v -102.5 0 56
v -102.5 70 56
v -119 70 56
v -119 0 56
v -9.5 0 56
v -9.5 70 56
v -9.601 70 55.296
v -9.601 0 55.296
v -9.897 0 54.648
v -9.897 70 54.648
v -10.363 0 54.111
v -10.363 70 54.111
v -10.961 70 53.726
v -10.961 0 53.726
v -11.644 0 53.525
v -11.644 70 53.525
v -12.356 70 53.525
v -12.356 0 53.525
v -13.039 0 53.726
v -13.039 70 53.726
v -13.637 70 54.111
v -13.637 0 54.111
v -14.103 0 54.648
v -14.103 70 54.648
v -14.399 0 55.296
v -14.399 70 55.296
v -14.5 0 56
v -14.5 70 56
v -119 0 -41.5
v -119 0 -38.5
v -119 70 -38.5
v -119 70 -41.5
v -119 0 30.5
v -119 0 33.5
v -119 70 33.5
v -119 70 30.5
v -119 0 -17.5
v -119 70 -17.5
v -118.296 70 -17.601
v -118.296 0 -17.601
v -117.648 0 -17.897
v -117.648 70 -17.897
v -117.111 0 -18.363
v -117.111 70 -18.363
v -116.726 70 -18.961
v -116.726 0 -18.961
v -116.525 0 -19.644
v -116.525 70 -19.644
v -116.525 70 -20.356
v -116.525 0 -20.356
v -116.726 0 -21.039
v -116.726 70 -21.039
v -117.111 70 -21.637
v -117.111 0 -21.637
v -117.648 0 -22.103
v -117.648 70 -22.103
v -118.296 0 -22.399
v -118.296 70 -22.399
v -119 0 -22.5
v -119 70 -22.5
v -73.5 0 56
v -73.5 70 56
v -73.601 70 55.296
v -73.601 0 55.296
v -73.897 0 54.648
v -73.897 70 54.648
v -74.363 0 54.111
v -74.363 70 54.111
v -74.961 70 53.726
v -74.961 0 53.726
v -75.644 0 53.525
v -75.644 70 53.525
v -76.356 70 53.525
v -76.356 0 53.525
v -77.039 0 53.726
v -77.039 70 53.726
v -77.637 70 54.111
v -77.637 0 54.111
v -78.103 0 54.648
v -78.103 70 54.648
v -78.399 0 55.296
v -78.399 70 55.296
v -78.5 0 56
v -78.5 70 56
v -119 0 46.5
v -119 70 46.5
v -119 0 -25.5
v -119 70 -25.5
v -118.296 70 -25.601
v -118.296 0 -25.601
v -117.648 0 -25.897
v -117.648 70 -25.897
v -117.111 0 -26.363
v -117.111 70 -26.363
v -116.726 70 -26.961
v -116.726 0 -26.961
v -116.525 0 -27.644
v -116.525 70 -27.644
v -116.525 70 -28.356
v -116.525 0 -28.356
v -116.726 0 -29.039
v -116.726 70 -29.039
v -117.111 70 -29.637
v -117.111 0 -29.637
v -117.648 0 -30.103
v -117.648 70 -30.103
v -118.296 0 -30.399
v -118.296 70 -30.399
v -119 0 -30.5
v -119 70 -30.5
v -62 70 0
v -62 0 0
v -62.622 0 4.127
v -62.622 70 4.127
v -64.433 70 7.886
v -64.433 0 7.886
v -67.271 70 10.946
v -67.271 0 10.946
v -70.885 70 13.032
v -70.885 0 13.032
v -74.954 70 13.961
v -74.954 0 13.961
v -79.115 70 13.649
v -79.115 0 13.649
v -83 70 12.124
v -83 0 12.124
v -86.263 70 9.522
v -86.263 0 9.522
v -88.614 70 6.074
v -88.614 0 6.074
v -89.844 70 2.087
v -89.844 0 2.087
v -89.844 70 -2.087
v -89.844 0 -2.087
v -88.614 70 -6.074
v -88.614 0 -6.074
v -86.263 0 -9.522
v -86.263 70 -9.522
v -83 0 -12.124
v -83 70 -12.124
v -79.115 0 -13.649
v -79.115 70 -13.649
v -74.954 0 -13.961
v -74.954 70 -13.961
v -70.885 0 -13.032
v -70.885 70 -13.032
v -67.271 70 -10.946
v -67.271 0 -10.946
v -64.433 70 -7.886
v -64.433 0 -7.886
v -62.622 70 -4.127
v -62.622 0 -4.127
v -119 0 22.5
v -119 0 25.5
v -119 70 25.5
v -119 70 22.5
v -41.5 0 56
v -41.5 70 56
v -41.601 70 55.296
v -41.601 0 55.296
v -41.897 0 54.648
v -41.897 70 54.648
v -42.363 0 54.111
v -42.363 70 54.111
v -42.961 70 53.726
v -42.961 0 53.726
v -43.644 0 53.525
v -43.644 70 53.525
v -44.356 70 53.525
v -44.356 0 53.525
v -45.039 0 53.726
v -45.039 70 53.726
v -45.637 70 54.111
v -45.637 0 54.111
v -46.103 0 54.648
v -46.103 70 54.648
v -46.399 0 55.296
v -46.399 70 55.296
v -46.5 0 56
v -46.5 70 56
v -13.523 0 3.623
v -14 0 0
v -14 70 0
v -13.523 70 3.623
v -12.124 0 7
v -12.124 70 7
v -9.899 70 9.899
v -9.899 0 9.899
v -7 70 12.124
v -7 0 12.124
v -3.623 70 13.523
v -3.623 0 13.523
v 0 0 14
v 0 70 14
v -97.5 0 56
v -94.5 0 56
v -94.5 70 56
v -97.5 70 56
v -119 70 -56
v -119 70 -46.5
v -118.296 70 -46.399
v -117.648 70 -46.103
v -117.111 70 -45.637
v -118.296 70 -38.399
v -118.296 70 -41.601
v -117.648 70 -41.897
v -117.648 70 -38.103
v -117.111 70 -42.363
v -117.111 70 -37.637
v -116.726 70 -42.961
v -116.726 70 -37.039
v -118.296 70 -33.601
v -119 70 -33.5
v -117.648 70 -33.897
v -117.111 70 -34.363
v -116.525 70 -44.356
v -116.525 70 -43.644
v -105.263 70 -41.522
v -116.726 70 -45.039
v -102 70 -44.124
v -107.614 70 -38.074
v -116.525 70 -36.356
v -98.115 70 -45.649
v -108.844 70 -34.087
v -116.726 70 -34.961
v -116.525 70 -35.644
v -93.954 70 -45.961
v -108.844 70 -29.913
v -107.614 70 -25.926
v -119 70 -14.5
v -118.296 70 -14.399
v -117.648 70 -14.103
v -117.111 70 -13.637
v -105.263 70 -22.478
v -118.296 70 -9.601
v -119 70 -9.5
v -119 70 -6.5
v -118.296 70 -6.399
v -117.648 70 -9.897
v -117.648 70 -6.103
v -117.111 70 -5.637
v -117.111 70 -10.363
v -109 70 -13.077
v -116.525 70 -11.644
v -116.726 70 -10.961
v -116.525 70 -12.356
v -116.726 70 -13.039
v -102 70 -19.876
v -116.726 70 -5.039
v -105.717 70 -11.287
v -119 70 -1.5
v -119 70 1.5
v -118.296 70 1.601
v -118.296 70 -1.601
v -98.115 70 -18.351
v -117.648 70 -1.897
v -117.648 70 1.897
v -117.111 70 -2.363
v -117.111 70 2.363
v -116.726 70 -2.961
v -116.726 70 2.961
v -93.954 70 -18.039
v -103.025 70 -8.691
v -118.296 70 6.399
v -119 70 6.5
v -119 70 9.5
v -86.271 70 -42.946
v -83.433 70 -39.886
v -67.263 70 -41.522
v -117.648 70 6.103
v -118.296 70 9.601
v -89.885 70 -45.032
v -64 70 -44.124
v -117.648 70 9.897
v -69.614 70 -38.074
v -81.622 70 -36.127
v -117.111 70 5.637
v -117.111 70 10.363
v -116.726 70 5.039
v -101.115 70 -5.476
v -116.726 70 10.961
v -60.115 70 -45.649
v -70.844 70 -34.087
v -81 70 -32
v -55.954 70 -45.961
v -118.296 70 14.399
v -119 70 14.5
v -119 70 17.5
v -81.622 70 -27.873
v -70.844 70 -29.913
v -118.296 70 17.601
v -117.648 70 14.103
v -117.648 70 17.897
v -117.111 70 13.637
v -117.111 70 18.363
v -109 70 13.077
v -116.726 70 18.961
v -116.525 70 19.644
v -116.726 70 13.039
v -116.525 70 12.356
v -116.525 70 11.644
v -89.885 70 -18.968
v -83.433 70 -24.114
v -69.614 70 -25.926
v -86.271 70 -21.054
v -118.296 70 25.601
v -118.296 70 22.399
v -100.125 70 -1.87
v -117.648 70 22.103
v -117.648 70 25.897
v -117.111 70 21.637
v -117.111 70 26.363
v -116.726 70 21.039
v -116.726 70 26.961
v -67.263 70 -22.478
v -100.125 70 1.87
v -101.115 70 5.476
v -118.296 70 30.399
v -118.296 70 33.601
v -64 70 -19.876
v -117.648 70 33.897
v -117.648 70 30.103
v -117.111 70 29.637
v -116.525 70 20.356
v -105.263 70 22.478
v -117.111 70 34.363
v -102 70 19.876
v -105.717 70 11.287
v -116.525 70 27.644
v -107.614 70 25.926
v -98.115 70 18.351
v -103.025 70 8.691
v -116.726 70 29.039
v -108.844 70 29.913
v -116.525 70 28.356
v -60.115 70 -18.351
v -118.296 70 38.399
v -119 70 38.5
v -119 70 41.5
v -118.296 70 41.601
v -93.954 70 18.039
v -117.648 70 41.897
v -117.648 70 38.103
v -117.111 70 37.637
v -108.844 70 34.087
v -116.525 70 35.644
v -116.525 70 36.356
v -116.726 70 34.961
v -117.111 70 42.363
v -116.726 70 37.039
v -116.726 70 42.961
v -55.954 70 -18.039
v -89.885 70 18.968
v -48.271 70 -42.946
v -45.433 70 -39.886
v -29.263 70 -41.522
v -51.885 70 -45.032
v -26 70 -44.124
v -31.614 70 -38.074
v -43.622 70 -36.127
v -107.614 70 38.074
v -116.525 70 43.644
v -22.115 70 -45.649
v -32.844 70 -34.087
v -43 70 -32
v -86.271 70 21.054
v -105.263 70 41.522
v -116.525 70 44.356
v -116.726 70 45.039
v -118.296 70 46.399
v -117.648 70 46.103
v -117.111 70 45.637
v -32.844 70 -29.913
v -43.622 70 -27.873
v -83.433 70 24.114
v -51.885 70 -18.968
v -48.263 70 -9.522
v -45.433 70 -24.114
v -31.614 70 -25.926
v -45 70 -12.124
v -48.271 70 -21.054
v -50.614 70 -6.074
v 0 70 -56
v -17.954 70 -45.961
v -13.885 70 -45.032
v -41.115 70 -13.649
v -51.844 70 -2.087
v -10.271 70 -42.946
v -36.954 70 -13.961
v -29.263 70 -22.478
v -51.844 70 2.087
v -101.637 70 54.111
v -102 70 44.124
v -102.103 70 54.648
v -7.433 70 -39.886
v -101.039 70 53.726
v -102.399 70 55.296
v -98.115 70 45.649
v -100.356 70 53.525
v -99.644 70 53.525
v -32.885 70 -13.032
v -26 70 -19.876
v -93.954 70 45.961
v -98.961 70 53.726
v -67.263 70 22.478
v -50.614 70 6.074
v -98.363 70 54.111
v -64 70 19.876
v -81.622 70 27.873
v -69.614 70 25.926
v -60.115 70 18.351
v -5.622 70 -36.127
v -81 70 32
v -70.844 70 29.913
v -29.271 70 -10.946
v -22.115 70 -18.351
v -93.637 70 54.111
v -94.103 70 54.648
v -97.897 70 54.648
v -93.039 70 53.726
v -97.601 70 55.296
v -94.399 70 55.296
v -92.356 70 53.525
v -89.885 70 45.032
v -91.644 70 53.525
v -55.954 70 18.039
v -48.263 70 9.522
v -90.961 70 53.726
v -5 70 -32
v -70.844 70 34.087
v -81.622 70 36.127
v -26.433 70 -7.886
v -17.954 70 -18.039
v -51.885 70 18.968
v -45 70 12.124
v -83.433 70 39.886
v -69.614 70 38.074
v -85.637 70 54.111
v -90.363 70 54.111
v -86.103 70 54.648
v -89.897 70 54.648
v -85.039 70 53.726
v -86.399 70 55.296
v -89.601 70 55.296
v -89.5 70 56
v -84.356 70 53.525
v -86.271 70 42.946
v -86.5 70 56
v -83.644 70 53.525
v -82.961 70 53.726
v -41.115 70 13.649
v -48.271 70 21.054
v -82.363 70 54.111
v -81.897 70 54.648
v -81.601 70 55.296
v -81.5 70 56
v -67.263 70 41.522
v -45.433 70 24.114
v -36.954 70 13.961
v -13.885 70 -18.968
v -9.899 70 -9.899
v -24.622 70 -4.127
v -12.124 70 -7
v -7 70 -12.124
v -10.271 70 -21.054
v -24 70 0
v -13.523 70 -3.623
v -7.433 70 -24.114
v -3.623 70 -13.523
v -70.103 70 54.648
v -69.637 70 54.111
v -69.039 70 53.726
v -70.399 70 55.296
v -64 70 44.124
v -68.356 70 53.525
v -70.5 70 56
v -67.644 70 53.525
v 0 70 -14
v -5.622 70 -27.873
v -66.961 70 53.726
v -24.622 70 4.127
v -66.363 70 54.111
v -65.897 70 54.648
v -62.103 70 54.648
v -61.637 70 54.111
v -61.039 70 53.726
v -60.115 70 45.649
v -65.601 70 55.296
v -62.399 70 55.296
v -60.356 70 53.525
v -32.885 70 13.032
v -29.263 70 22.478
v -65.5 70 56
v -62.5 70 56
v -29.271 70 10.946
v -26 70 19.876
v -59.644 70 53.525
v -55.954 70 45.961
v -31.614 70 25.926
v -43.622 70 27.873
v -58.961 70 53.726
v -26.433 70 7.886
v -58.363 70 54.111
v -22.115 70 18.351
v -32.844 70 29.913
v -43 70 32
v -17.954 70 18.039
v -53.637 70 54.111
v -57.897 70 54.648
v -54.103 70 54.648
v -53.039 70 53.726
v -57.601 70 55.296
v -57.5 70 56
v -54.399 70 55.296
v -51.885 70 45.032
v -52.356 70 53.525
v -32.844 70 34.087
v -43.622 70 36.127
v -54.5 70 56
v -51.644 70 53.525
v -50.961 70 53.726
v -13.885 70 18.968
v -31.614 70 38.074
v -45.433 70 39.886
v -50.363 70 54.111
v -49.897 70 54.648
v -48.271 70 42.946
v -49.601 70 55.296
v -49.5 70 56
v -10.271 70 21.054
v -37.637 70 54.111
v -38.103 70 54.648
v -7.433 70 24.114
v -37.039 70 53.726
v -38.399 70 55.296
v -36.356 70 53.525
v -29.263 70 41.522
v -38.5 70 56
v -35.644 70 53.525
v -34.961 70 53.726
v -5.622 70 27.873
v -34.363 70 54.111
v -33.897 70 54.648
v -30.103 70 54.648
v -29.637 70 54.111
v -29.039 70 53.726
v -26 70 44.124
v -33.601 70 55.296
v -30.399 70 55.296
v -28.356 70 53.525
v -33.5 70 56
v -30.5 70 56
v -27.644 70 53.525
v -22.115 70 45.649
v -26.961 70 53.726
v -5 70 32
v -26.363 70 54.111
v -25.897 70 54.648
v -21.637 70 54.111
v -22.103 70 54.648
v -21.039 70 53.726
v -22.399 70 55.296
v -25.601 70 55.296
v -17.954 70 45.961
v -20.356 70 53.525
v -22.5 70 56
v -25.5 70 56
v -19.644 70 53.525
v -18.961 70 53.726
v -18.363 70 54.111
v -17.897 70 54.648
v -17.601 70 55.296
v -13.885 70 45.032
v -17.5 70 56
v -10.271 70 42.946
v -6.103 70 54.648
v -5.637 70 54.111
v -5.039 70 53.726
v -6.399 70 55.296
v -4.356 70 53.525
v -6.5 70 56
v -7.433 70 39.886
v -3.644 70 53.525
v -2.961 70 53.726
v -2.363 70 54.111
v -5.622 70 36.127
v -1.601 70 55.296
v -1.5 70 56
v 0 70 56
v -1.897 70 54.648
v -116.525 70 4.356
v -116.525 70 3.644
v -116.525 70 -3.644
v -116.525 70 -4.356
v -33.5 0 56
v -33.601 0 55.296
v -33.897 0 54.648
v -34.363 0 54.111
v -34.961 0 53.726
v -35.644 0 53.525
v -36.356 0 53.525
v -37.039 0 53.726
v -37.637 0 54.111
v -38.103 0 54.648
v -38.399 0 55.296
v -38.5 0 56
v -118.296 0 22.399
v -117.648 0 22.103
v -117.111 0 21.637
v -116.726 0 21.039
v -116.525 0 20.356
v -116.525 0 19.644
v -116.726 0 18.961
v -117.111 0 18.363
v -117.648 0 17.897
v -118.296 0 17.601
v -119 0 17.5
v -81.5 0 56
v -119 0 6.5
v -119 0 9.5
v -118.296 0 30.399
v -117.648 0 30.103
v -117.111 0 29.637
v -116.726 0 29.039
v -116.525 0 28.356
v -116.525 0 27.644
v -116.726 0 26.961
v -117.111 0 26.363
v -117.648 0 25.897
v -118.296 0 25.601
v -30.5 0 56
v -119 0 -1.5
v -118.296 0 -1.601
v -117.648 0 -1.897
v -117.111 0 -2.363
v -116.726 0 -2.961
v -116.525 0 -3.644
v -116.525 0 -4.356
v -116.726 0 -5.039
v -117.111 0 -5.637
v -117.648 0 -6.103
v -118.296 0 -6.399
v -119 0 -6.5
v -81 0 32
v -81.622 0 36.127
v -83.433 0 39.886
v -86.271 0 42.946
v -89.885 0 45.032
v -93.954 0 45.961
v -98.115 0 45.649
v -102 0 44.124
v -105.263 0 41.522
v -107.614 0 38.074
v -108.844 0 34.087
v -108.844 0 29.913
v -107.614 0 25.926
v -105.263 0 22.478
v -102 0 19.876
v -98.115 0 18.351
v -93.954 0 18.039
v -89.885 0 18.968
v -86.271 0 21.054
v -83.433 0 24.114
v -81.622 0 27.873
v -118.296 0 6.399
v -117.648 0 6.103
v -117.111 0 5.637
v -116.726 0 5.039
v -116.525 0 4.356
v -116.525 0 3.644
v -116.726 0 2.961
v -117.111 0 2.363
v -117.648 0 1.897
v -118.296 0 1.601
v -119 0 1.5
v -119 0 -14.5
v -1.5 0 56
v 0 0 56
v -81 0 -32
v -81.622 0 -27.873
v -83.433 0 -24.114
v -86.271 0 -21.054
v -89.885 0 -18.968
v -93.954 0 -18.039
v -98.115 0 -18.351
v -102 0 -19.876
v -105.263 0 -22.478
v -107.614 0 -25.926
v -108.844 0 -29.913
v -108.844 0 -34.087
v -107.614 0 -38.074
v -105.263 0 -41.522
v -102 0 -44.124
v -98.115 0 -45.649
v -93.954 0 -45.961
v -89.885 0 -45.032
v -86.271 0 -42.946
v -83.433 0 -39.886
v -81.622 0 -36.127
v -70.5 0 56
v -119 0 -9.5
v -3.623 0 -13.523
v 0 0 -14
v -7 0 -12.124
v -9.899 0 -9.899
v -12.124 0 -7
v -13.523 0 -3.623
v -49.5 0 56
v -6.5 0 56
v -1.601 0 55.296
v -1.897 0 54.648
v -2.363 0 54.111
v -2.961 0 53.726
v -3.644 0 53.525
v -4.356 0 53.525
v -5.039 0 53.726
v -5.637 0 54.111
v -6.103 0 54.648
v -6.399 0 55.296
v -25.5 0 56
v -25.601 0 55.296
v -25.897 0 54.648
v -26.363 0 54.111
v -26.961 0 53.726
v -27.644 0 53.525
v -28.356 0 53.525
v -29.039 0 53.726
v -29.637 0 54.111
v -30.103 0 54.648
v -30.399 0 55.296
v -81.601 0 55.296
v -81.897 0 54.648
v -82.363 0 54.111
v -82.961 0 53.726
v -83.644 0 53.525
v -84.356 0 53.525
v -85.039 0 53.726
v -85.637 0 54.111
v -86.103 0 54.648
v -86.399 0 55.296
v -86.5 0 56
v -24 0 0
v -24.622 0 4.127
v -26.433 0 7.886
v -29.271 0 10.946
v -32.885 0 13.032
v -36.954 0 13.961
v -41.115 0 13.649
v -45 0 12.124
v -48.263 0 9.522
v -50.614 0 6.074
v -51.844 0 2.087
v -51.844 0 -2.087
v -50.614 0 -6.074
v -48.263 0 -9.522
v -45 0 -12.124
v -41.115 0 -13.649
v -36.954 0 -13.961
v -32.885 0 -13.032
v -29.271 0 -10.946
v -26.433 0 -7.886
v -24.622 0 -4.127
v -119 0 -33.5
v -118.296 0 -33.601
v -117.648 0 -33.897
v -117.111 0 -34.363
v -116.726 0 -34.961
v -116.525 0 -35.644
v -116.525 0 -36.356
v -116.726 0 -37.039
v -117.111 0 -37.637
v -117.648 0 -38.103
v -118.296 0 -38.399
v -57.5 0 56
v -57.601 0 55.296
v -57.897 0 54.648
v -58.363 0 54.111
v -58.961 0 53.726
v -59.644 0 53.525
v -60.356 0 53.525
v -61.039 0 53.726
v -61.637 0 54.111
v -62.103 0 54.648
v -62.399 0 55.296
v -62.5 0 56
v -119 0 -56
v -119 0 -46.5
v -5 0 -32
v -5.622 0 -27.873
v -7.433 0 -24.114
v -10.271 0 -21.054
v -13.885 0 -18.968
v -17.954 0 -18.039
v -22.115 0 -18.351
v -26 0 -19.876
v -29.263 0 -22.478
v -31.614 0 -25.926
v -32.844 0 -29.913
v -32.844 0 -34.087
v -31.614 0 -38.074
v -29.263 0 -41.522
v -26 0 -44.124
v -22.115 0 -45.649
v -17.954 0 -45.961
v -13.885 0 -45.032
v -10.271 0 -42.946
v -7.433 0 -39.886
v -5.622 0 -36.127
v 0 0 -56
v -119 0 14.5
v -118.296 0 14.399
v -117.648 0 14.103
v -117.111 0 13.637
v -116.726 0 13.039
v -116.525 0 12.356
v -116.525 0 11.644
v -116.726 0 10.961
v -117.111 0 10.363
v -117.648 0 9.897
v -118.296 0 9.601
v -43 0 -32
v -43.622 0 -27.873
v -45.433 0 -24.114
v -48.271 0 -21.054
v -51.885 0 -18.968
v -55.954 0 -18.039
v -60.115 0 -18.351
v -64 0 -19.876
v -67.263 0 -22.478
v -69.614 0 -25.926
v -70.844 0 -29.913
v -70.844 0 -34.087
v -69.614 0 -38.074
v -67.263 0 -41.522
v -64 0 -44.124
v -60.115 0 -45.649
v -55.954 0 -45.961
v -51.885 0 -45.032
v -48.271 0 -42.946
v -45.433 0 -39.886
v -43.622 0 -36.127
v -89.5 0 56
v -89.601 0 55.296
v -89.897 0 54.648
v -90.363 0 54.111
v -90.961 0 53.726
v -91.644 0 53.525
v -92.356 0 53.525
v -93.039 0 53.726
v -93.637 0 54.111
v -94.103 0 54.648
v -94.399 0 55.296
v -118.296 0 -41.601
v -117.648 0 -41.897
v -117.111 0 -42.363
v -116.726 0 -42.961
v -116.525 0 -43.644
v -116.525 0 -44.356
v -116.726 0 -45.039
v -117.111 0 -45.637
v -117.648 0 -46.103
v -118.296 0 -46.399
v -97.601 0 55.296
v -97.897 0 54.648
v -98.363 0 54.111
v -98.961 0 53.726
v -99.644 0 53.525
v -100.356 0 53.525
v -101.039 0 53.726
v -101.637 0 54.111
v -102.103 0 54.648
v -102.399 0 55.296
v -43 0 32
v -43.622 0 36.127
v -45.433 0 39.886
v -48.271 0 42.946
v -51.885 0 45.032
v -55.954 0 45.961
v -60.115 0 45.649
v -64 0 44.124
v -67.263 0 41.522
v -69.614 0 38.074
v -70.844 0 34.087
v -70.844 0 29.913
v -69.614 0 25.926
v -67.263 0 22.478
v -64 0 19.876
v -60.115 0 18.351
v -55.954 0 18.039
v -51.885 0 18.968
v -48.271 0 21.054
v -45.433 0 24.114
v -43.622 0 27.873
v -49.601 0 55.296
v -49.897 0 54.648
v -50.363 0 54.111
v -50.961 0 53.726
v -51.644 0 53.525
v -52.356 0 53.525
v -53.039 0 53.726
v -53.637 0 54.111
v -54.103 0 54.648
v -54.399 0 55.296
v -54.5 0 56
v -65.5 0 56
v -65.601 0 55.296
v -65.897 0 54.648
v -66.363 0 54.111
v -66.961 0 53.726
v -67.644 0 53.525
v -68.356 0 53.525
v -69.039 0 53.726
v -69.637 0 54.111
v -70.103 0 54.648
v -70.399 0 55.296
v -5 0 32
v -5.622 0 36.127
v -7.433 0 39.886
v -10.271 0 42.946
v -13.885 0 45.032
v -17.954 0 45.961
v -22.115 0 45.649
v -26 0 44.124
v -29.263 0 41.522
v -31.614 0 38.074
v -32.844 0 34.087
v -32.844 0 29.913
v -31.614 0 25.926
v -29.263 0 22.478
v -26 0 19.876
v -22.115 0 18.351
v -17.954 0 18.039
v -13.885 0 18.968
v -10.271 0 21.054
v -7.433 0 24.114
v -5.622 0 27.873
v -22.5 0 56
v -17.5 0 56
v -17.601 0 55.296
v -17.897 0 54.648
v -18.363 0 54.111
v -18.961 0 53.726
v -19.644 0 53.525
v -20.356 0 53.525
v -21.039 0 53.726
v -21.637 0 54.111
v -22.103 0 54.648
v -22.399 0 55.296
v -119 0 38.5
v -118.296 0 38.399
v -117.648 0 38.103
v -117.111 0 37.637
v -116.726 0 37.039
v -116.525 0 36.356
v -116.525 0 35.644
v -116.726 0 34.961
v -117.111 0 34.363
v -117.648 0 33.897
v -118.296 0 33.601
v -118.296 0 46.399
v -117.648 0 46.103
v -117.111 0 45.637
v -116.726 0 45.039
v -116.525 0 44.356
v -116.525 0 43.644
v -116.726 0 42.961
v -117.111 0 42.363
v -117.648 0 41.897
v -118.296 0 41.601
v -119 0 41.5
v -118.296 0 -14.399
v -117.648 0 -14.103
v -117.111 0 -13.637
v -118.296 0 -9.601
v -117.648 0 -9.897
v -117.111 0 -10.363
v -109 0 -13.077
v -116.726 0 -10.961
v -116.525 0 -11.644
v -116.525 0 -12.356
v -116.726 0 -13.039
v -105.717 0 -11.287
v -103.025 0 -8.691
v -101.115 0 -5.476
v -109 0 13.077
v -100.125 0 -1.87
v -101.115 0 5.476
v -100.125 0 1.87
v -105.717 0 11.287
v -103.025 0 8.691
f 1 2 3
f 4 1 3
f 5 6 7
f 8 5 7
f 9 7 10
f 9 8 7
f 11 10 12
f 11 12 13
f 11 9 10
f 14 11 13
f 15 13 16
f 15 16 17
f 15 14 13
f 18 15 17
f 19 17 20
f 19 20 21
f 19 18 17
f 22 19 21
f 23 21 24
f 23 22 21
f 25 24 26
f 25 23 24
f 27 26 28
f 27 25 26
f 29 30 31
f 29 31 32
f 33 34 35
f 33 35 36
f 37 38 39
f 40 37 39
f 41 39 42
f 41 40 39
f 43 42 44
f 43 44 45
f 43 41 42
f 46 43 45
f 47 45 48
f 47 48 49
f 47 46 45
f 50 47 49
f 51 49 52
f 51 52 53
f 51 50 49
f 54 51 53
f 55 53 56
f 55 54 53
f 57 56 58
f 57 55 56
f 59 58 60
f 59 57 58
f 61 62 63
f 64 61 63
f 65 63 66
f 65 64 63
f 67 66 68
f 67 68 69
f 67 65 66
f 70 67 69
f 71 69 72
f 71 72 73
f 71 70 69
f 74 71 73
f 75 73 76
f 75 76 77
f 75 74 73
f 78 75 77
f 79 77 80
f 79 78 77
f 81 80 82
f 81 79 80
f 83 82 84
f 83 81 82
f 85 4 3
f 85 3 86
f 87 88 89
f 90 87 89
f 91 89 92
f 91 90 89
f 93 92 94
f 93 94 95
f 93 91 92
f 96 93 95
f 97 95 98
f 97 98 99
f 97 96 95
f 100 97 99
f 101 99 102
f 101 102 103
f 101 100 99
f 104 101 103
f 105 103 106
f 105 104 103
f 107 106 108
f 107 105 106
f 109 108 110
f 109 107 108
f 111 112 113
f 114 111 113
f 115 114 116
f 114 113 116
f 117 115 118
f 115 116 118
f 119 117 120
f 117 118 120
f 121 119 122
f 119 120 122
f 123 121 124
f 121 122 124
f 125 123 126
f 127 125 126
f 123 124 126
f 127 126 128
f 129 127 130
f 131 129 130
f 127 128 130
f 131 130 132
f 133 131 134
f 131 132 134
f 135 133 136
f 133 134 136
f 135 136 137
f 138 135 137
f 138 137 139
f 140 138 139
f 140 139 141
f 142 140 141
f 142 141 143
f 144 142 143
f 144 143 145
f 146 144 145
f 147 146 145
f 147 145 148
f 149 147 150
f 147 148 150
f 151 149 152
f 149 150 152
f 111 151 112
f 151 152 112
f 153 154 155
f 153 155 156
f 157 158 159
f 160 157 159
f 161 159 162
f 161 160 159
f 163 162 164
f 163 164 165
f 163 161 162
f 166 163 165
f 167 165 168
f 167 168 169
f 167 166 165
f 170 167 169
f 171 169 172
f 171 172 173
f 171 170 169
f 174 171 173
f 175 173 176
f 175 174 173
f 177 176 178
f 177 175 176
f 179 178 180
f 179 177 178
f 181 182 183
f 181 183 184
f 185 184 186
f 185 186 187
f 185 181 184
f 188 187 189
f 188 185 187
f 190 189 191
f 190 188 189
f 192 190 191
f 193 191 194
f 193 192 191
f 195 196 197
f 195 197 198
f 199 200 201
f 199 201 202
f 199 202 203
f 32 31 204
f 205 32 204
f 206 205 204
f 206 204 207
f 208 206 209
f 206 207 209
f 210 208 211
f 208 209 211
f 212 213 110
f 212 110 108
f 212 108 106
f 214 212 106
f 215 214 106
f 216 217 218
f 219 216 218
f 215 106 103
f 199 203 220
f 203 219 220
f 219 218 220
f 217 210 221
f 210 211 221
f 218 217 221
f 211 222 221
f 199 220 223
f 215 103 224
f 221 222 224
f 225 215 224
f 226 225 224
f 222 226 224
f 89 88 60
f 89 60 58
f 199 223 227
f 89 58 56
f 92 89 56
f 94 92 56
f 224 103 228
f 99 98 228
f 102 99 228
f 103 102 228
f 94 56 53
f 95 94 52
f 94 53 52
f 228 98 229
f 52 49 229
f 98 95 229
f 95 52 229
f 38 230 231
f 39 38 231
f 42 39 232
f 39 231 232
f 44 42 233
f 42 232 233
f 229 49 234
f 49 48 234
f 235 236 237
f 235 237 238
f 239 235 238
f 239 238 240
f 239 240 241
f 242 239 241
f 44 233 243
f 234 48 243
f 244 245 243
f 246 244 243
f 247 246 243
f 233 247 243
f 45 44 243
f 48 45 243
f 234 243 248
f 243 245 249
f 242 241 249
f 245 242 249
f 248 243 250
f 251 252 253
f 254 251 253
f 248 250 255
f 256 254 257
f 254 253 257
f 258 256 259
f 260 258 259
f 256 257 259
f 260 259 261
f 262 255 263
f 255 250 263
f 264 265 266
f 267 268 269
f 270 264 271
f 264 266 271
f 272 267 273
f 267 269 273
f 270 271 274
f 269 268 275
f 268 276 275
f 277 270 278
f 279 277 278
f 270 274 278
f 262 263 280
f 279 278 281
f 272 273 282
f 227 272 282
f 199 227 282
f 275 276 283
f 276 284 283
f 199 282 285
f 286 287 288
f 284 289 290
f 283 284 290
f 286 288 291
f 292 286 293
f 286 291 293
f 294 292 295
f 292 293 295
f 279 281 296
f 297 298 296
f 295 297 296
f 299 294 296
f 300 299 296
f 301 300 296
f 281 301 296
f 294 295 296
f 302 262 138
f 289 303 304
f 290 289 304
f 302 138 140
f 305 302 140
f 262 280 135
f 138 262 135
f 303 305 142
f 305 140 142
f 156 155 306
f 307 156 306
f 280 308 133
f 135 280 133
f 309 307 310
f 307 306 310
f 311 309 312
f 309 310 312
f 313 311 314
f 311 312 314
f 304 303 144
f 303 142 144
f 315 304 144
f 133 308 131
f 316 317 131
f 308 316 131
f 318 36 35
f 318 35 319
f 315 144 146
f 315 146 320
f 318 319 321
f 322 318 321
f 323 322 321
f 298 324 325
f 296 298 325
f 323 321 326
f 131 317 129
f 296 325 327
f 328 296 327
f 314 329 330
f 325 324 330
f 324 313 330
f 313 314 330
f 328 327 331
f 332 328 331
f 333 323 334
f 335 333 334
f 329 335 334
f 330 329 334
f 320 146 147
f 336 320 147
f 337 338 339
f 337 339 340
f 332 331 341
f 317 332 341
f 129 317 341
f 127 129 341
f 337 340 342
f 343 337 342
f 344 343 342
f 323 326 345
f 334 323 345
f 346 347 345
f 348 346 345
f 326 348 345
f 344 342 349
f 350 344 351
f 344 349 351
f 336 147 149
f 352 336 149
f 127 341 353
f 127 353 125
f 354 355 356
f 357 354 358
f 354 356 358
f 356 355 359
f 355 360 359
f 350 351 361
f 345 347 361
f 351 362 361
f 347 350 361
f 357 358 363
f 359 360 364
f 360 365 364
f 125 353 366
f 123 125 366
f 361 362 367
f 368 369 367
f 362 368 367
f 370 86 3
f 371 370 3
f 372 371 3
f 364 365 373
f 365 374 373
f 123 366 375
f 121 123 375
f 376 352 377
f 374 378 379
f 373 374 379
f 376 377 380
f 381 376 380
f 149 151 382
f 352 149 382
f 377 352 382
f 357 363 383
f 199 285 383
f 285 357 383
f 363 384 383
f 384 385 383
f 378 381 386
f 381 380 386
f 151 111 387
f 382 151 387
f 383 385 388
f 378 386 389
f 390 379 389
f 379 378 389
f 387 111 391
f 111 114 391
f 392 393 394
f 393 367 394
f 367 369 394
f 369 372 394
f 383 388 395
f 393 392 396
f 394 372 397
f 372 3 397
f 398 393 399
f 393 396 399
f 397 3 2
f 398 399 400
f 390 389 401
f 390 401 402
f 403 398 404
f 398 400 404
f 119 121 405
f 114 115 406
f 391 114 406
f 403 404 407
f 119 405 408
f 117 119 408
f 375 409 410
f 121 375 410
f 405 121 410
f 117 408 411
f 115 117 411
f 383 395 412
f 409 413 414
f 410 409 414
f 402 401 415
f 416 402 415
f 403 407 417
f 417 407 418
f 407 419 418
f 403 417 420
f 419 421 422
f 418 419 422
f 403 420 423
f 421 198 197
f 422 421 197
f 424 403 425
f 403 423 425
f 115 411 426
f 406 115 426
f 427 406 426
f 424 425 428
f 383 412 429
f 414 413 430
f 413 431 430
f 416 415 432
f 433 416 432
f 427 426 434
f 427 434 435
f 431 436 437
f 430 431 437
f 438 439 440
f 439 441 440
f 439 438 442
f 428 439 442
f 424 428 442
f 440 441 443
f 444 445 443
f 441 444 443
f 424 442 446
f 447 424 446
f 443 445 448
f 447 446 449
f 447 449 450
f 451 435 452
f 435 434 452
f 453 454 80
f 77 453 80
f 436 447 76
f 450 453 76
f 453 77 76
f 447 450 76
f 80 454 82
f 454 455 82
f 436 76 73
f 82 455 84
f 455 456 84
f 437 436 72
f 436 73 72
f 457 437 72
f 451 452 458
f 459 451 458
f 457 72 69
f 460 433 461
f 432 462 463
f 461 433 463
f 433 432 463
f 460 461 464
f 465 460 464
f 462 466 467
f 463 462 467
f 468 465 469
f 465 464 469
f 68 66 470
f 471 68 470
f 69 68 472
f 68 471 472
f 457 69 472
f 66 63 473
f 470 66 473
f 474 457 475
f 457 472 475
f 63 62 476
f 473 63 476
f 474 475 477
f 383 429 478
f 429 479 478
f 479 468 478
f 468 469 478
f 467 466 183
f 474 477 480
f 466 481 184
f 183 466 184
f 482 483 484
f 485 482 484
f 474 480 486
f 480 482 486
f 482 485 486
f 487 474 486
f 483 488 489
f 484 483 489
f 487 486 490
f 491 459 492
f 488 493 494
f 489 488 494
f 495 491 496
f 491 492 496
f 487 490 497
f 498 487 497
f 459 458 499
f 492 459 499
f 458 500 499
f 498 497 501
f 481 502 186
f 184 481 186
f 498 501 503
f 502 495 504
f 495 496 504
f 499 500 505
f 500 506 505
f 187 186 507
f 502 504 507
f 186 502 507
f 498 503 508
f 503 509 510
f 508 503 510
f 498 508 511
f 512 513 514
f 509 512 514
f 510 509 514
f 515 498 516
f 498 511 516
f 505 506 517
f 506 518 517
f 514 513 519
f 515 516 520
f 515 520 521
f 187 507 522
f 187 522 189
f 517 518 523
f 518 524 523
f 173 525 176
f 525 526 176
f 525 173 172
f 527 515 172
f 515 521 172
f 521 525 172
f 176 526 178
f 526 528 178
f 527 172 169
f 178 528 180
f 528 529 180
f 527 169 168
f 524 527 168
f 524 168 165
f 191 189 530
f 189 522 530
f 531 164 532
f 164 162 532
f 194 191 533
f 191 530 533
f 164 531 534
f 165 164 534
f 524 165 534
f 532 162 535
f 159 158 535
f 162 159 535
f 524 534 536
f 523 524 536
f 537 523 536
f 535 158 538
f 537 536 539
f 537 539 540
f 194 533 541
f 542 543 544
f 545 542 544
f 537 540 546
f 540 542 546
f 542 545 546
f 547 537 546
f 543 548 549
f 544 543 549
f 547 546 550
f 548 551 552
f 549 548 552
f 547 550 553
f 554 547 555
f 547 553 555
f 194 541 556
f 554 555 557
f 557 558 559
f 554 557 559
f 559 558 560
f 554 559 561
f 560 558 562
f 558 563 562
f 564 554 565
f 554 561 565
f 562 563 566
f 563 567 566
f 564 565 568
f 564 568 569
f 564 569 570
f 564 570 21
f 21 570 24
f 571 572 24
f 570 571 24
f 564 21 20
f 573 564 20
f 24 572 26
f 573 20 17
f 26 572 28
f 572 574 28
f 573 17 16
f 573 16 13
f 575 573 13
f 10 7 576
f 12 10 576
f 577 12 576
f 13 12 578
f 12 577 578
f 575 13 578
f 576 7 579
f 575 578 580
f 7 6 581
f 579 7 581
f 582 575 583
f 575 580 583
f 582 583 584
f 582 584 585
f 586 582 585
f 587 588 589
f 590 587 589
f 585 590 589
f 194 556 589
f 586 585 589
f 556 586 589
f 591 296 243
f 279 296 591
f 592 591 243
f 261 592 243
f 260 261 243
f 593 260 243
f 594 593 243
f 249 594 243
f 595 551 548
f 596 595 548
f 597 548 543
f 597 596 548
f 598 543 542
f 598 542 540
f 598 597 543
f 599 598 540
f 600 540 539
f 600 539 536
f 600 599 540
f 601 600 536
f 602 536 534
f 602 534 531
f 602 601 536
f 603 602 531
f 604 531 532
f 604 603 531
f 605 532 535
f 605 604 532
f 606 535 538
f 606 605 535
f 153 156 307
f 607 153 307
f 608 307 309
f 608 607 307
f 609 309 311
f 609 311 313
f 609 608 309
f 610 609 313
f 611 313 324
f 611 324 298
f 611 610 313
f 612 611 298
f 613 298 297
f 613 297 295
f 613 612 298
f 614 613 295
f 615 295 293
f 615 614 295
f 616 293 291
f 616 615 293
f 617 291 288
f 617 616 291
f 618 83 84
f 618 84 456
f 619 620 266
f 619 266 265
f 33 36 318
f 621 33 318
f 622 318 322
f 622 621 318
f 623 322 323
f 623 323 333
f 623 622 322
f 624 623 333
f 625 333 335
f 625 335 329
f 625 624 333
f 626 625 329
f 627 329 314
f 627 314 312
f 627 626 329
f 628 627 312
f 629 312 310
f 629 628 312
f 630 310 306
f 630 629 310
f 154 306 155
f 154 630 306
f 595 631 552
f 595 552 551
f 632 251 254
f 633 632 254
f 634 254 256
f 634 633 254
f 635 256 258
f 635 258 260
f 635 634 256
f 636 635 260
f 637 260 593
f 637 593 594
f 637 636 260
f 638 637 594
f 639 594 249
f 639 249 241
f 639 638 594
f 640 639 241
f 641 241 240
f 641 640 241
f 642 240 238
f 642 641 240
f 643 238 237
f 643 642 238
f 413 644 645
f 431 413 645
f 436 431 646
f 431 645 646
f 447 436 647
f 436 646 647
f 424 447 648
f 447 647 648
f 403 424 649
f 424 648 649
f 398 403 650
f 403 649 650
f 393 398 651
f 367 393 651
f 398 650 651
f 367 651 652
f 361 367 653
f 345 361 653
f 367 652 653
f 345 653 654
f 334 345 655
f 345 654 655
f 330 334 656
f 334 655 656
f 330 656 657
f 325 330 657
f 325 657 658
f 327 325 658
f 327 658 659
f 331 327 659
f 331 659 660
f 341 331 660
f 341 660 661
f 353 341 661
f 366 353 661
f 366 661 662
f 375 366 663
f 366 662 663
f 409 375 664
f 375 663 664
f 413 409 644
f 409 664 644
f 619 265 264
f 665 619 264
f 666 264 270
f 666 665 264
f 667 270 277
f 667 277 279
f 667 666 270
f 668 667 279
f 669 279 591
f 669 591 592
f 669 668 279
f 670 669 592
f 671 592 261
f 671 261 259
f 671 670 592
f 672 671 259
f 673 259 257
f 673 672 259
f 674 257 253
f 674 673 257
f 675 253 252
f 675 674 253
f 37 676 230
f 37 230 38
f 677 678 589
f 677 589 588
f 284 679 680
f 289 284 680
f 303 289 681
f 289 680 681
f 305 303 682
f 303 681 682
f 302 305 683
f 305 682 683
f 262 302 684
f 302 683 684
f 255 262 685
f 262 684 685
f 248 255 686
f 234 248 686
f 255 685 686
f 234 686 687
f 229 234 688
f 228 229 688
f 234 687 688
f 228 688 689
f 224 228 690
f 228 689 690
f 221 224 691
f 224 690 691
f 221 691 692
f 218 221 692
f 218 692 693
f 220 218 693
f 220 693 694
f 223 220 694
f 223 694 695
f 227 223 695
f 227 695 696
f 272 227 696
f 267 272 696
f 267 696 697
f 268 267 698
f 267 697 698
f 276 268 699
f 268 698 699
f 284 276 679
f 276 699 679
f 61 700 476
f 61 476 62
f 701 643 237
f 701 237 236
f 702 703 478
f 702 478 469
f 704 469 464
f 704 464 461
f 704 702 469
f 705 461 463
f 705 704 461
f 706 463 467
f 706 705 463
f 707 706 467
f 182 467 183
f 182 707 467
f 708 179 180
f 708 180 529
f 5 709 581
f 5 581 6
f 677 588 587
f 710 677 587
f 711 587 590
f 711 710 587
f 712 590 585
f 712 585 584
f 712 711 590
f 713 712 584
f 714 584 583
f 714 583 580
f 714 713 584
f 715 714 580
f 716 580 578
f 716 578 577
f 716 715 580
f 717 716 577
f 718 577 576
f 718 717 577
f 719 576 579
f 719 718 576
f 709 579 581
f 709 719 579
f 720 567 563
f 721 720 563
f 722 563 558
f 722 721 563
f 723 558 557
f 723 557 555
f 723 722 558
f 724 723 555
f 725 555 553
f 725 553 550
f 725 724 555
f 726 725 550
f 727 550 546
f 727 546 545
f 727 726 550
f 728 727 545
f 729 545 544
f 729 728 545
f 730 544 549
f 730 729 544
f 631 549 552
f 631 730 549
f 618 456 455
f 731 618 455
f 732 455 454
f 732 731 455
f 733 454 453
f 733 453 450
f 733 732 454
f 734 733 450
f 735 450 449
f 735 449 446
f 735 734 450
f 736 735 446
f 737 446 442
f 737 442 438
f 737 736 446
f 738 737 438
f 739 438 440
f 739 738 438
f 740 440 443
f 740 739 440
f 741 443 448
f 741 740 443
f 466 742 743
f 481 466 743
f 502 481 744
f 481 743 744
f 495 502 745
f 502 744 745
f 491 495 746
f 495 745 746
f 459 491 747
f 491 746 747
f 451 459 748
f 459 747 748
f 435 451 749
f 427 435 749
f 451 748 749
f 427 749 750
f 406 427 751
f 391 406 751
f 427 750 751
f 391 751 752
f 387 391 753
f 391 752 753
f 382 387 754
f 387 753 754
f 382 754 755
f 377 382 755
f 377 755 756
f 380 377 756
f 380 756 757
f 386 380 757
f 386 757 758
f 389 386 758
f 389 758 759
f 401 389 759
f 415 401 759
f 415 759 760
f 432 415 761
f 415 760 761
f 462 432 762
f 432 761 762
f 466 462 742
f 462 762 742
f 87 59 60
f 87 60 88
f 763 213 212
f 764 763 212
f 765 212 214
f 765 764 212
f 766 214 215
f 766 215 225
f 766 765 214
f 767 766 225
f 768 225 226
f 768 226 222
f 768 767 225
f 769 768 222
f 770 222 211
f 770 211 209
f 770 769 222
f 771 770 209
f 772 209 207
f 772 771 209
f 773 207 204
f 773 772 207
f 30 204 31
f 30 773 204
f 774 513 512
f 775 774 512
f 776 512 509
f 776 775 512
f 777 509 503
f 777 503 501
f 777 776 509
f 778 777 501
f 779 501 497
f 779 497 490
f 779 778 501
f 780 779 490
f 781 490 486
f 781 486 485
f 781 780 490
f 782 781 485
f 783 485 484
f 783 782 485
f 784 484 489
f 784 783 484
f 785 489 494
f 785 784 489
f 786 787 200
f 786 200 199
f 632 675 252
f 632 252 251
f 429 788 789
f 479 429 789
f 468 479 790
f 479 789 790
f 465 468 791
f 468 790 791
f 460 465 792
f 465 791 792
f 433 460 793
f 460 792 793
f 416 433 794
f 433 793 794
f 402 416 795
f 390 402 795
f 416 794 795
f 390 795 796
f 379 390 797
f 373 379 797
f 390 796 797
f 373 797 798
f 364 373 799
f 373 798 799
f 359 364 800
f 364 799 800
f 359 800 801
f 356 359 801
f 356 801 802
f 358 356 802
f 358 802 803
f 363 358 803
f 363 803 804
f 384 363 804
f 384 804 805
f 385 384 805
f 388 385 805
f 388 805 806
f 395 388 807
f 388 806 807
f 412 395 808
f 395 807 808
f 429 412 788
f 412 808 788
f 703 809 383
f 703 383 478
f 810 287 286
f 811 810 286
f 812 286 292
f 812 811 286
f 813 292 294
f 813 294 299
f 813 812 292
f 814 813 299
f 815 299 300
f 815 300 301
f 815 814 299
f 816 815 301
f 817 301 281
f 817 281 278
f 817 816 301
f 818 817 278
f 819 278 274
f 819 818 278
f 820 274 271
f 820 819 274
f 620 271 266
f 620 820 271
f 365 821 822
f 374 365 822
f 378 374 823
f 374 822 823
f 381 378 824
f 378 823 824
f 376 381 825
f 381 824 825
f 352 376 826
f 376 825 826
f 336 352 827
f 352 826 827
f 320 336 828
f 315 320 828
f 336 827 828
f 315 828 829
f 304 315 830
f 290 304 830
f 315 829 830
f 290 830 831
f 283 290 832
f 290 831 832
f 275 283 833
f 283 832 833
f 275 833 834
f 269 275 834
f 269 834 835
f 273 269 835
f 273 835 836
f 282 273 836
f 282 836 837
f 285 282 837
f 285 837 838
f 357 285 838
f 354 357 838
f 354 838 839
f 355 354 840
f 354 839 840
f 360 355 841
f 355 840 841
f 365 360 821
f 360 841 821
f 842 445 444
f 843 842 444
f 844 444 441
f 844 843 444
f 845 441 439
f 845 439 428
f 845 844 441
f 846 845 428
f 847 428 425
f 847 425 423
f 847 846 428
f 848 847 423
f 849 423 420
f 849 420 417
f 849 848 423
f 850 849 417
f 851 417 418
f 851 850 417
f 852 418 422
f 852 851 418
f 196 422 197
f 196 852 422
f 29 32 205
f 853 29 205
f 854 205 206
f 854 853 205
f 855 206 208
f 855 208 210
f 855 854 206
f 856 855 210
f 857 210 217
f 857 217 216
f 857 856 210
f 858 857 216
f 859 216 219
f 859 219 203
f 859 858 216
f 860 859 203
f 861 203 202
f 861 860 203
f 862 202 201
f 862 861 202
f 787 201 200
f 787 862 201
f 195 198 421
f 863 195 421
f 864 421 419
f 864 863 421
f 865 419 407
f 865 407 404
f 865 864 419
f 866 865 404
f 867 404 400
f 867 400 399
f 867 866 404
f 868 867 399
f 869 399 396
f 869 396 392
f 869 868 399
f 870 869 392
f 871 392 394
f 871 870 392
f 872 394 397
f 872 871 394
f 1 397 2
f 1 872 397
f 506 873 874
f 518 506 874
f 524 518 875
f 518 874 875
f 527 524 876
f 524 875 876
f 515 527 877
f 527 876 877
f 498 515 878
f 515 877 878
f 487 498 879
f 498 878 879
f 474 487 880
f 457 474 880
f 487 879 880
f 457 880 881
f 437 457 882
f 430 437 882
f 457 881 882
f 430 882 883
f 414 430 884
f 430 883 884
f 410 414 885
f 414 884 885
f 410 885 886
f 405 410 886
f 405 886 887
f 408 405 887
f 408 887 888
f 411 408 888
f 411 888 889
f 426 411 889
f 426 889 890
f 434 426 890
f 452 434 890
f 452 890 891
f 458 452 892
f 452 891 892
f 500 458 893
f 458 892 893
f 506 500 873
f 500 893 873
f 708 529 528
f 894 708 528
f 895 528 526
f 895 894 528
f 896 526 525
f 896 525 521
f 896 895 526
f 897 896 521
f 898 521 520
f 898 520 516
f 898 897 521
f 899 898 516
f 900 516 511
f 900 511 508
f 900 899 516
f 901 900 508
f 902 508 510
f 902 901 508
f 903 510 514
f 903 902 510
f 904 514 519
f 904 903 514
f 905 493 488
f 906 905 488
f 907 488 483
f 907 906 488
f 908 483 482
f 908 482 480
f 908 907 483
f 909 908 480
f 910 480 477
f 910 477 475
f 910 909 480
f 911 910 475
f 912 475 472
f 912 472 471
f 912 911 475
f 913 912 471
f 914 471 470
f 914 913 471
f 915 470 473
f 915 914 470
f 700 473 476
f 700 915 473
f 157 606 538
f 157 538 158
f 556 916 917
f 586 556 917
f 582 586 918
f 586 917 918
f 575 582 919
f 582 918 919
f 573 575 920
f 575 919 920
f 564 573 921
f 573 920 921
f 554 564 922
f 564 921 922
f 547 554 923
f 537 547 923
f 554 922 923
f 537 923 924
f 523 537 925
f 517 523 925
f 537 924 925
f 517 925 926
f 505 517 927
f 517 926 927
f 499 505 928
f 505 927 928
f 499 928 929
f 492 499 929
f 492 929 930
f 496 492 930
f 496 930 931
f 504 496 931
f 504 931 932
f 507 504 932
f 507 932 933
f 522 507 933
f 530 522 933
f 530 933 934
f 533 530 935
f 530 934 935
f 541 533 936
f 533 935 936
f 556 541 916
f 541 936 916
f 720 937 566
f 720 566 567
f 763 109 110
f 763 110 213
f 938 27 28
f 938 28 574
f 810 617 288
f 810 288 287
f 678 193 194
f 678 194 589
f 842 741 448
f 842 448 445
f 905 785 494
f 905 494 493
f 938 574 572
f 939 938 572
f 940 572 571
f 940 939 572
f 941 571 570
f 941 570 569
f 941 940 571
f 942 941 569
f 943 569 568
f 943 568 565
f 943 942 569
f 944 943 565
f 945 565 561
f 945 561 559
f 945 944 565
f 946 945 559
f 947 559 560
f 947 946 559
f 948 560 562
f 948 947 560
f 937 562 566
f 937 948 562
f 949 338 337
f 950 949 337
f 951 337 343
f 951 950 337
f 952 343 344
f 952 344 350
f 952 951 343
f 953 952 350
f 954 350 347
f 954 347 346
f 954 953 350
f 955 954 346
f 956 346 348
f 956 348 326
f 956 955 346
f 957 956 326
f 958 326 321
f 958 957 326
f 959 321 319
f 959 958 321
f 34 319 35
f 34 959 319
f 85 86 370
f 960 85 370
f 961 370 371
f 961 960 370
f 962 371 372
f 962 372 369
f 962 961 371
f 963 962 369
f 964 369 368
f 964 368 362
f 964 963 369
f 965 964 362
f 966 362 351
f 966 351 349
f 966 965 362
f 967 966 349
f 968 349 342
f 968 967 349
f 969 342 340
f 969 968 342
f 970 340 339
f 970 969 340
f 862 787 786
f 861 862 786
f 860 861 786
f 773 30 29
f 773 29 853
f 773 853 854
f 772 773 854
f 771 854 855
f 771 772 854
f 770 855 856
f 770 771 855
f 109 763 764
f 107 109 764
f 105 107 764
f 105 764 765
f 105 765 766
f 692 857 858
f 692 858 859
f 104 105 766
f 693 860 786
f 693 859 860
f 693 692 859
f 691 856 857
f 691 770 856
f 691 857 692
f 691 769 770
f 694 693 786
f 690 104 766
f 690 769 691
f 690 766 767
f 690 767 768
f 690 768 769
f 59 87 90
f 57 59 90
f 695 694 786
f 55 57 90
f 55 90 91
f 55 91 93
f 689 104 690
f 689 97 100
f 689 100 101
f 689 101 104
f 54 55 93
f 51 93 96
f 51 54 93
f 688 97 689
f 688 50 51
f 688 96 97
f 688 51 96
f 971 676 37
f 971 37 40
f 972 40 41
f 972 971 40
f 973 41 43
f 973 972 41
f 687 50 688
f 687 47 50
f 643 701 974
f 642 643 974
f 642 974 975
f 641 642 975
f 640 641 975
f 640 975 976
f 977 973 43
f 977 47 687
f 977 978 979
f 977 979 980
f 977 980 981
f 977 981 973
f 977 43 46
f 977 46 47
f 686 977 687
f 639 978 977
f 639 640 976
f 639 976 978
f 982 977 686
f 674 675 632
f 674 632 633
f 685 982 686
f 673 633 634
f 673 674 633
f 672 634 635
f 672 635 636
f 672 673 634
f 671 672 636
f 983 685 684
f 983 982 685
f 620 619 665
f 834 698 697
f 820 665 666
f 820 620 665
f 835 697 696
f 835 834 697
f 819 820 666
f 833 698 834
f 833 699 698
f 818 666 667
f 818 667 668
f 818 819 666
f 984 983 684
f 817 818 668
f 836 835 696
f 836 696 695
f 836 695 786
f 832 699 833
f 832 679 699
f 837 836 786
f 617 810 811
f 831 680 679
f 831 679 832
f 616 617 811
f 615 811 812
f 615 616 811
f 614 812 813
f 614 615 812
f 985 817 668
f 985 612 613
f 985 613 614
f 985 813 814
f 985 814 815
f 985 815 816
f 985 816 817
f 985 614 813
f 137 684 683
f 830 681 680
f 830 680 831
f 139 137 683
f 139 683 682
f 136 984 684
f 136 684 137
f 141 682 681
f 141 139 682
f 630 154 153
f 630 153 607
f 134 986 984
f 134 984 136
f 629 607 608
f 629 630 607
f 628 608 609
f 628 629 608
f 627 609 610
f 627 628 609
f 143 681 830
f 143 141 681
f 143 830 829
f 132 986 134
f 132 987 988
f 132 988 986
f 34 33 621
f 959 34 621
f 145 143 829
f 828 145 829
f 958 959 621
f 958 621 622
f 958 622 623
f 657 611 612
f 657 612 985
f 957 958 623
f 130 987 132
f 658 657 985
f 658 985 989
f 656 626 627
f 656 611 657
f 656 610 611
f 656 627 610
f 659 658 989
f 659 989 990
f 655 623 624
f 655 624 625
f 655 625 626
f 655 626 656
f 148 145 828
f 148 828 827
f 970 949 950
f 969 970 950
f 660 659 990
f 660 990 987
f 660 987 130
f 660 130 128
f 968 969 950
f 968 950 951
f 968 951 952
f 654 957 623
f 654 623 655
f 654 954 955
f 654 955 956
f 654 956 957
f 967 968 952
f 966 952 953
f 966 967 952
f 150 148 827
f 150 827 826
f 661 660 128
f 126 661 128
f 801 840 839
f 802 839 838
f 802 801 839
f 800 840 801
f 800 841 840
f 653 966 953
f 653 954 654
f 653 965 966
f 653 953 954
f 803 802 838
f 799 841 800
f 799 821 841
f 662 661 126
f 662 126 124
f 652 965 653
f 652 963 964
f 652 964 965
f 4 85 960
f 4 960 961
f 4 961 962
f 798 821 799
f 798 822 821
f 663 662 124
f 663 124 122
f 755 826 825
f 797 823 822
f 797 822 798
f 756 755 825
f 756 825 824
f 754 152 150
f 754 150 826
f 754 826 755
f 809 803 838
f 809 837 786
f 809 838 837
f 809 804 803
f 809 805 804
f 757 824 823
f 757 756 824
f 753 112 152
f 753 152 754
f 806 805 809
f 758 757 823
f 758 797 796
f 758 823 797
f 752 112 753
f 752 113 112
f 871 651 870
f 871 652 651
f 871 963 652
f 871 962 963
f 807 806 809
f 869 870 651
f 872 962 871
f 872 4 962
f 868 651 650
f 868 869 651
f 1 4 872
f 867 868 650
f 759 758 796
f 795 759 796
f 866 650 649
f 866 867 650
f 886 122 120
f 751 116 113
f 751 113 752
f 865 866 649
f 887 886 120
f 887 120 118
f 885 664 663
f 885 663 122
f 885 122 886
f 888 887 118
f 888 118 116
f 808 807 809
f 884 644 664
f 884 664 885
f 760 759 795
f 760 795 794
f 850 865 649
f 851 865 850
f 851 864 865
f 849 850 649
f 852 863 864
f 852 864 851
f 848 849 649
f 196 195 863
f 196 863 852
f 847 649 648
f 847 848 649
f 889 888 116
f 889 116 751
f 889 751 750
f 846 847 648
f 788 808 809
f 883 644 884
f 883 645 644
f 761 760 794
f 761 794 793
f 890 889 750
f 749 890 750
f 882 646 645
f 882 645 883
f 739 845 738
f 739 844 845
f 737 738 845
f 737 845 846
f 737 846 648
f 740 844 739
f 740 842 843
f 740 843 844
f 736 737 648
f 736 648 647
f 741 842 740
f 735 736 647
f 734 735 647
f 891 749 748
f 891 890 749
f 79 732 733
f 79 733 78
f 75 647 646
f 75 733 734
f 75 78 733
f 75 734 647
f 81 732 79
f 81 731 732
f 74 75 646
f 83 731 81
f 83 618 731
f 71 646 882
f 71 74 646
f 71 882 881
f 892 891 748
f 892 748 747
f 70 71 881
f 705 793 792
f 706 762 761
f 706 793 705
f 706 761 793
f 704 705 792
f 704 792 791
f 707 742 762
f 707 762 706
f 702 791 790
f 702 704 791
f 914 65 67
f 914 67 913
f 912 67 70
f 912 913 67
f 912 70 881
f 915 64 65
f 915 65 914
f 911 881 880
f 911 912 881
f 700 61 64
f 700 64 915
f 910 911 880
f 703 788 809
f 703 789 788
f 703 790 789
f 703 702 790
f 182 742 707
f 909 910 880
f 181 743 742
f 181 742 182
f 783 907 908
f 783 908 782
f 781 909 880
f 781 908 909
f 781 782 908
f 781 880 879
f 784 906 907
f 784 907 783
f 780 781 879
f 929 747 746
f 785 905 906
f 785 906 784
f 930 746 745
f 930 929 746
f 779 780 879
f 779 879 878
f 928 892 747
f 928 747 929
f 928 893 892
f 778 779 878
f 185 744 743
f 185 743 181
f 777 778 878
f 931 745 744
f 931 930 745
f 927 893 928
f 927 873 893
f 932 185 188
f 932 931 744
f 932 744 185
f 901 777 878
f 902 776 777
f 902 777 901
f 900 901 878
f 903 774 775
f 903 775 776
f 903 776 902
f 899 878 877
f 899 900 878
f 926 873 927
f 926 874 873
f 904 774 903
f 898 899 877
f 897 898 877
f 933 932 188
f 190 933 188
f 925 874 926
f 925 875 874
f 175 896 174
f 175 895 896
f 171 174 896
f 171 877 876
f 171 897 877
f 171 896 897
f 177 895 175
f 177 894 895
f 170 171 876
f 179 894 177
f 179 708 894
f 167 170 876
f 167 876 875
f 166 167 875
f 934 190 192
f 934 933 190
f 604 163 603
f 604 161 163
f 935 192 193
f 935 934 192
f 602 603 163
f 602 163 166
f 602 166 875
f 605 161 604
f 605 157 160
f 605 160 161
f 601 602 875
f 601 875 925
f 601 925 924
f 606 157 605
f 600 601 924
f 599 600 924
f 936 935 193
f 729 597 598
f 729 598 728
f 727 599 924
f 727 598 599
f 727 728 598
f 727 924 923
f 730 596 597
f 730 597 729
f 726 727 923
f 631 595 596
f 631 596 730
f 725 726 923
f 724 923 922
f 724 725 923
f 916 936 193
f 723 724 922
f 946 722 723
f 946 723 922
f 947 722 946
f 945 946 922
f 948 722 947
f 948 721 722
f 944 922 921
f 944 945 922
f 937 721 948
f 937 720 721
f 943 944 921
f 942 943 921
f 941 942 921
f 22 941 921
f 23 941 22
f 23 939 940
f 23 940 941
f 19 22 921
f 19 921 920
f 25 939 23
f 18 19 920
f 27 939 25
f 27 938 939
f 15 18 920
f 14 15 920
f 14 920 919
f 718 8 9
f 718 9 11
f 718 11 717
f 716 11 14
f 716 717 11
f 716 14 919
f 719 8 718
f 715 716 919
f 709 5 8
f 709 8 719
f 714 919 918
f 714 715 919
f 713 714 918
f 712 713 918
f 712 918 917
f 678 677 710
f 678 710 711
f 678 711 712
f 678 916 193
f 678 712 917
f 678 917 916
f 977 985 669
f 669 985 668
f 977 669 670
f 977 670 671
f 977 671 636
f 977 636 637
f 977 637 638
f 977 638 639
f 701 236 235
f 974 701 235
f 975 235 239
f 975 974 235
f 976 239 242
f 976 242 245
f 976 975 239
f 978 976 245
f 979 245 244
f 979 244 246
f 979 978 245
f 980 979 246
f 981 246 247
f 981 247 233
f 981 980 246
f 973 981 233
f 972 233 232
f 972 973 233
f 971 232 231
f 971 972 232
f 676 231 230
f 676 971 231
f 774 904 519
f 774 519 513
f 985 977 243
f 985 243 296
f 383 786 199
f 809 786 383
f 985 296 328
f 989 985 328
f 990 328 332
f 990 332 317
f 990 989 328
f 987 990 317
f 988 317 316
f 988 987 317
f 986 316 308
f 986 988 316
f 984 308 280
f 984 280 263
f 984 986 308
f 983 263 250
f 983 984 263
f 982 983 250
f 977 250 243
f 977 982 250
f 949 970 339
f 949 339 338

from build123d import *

# Parameters (mm, degrees)
F0_R     = 14
F1_DEPTH = 70


with BuildPart() as f1:
    # F0 (on Front) → F1 (new body)
    with BuildSketch(Plane.XZ):
        with BuildLine():
            Line((-119, -46.5), (-119, -56))
            Line((-119, -56), (0, -56))
            Line((0, -56), (0, -14))
            ThreePointArc((0, -14), (-9.899495, -9.899495), (-14, 0))
            ThreePointArc((-14, 0), (-9.899495, 9.899495), (0, 14))
            Line((0, 14), (0, 56))
            Line((0, 56), (-1.5, 56))
            ThreePointArc((-1.5, 56), (-4, 53.5), (-6.5, 56))
            Line((-6.5, 56), (-9.5, 56))
            ThreePointArc((-9.5, 56), (-12, 53.5), (-14.5, 56))
            Line((-14.5, 56), (-17.5, 56))
            ThreePointArc((-17.5, 56), (-20, 53.5), (-22.5, 56))
            Line((-22.5, 56), (-25.5, 56))
            ThreePointArc((-25.5, 56), (-28, 53.5), (-30.5, 56))
            Line((-30.5, 56), (-33.5, 56))
            ThreePointArc((-33.5, 56), (-36, 53.5), (-38.5, 56))
            Line((-38.5, 56), (-41.5, 56))
            ThreePointArc((-41.5, 56), (-44, 53.5), (-46.5, 56))
            Line((-46.5, 56), (-49.5, 56))
            ThreePointArc((-49.5, 56), (-52, 53.5), (-54.5, 56))
            Line((-54.5, 56), (-57.5, 56))
            ThreePointArc((-57.5, 56), (-60, 53.5), (-62.5, 56))
            Line((-62.5, 56), (-65.5, 56))
            ThreePointArc((-65.5, 56), (-68, 53.5), (-70.5, 56))
            Line((-70.5, 56), (-73.5, 56))
            ThreePointArc((-73.5, 56), (-76, 53.5), (-78.5, 56))
            Line((-78.5, 56), (-81.5, 56))
            ThreePointArc((-81.5, 56), (-84, 53.5), (-86.5, 56))
            Line((-86.5, 56), (-89.5, 56))
            ThreePointArc((-89.5, 56), (-92, 53.5), (-94.5, 56))
            Line((-94.5, 56), (-97.5, 56))
            ThreePointArc((-97.5, 56), (-100, 53.5), (-102.5, 56))
            Line((-102.5, 56), (-119, 56))
            Line((-119, 56), (-119, 46.5))
            ThreePointArc((-119, 46.5), (-116.5, 44), (-119, 41.5))
            Line((-119, 41.5), (-119, 38.5))
            ThreePointArc((-119, 38.5), (-116.5, 36), (-119, 33.5))
            Line((-119, 33.5), (-119, 30.5))
            ThreePointArc((-119, 30.5), (-116.5, 28), (-119, 25.5))
            Line((-119, 25.5), (-119, 22.5))
            ThreePointArc((-119, 22.5), (-116.5, 20), (-119, 17.5))
            Line((-119, 17.5), (-119, 14.5))
            ThreePointArc((-119, 14.5), (-116.5, 12), (-119, 9.5))
            Line((-119, 9.5), (-119, 6.5))
            ThreePointArc((-119, 6.5), (-116.5, 4), (-119, 1.5))
            Line((-119, 1.5), (-119, -1.5))
            ThreePointArc((-119, -1.5), (-116.5, -4), (-119, -6.5))
            Line((-119, -6.5), (-119, -9.5))
            ThreePointArc((-119, -9.5), (-116.5, -12), (-119, -14.5))
            Line((-119, -14.5), (-119, -17.5))
            ThreePointArc((-119, -17.5), (-116.5, -20), (-119, -22.5))
            Line((-119, -22.5), (-119, -25.5))
            ThreePointArc((-119, -25.5), (-116.5, -28), (-119, -30.5))
            Line((-119, -30.5), (-119, -33.5))
            ThreePointArc((-119, -33.5), (-116.5, -36), (-119, -38.5))
            Line((-119, -38.5), (-119, -41.5))
            ThreePointArc((-119, -41.5), (-116.5, -44), (-119, -46.5))
        make_face()
        with Locations((-95, -32)):
            Circle(F0_R, mode=Mode.SUBTRACT)
        with Locations((-57, -32)):
            Circle(F0_R, mode=Mode.SUBTRACT)
        with Locations((-19, -32)):
            Circle(F0_R, mode=Mode.SUBTRACT)
        with BuildLine():
            Line((-109, -13.076697), (-109, 13.076697))
            ThreePointArc((-109, 13.076697), (-100, 0), (-109, -13.076697))
        make_face(mode=Mode.SUBTRACT)
        with Locations((-76, 0)):
            Circle(F0_R, mode=Mode.SUBTRACT)
        with Locations((-95, 32)):
            Circle(F0_R, mode=Mode.SUBTRACT)
        with Locations((-38, 0)):
            Circle(F0_R, mode=Mode.SUBTRACT)
        with Locations((-57, 32)):
            Circle(F0_R, mode=Mode.SUBTRACT)
        with Locations((-19, 32)):
            Circle(F0_R, mode=Mode.SUBTRACT)
    extrude(amount=-F1_DEPTH)


solid = f1.part
